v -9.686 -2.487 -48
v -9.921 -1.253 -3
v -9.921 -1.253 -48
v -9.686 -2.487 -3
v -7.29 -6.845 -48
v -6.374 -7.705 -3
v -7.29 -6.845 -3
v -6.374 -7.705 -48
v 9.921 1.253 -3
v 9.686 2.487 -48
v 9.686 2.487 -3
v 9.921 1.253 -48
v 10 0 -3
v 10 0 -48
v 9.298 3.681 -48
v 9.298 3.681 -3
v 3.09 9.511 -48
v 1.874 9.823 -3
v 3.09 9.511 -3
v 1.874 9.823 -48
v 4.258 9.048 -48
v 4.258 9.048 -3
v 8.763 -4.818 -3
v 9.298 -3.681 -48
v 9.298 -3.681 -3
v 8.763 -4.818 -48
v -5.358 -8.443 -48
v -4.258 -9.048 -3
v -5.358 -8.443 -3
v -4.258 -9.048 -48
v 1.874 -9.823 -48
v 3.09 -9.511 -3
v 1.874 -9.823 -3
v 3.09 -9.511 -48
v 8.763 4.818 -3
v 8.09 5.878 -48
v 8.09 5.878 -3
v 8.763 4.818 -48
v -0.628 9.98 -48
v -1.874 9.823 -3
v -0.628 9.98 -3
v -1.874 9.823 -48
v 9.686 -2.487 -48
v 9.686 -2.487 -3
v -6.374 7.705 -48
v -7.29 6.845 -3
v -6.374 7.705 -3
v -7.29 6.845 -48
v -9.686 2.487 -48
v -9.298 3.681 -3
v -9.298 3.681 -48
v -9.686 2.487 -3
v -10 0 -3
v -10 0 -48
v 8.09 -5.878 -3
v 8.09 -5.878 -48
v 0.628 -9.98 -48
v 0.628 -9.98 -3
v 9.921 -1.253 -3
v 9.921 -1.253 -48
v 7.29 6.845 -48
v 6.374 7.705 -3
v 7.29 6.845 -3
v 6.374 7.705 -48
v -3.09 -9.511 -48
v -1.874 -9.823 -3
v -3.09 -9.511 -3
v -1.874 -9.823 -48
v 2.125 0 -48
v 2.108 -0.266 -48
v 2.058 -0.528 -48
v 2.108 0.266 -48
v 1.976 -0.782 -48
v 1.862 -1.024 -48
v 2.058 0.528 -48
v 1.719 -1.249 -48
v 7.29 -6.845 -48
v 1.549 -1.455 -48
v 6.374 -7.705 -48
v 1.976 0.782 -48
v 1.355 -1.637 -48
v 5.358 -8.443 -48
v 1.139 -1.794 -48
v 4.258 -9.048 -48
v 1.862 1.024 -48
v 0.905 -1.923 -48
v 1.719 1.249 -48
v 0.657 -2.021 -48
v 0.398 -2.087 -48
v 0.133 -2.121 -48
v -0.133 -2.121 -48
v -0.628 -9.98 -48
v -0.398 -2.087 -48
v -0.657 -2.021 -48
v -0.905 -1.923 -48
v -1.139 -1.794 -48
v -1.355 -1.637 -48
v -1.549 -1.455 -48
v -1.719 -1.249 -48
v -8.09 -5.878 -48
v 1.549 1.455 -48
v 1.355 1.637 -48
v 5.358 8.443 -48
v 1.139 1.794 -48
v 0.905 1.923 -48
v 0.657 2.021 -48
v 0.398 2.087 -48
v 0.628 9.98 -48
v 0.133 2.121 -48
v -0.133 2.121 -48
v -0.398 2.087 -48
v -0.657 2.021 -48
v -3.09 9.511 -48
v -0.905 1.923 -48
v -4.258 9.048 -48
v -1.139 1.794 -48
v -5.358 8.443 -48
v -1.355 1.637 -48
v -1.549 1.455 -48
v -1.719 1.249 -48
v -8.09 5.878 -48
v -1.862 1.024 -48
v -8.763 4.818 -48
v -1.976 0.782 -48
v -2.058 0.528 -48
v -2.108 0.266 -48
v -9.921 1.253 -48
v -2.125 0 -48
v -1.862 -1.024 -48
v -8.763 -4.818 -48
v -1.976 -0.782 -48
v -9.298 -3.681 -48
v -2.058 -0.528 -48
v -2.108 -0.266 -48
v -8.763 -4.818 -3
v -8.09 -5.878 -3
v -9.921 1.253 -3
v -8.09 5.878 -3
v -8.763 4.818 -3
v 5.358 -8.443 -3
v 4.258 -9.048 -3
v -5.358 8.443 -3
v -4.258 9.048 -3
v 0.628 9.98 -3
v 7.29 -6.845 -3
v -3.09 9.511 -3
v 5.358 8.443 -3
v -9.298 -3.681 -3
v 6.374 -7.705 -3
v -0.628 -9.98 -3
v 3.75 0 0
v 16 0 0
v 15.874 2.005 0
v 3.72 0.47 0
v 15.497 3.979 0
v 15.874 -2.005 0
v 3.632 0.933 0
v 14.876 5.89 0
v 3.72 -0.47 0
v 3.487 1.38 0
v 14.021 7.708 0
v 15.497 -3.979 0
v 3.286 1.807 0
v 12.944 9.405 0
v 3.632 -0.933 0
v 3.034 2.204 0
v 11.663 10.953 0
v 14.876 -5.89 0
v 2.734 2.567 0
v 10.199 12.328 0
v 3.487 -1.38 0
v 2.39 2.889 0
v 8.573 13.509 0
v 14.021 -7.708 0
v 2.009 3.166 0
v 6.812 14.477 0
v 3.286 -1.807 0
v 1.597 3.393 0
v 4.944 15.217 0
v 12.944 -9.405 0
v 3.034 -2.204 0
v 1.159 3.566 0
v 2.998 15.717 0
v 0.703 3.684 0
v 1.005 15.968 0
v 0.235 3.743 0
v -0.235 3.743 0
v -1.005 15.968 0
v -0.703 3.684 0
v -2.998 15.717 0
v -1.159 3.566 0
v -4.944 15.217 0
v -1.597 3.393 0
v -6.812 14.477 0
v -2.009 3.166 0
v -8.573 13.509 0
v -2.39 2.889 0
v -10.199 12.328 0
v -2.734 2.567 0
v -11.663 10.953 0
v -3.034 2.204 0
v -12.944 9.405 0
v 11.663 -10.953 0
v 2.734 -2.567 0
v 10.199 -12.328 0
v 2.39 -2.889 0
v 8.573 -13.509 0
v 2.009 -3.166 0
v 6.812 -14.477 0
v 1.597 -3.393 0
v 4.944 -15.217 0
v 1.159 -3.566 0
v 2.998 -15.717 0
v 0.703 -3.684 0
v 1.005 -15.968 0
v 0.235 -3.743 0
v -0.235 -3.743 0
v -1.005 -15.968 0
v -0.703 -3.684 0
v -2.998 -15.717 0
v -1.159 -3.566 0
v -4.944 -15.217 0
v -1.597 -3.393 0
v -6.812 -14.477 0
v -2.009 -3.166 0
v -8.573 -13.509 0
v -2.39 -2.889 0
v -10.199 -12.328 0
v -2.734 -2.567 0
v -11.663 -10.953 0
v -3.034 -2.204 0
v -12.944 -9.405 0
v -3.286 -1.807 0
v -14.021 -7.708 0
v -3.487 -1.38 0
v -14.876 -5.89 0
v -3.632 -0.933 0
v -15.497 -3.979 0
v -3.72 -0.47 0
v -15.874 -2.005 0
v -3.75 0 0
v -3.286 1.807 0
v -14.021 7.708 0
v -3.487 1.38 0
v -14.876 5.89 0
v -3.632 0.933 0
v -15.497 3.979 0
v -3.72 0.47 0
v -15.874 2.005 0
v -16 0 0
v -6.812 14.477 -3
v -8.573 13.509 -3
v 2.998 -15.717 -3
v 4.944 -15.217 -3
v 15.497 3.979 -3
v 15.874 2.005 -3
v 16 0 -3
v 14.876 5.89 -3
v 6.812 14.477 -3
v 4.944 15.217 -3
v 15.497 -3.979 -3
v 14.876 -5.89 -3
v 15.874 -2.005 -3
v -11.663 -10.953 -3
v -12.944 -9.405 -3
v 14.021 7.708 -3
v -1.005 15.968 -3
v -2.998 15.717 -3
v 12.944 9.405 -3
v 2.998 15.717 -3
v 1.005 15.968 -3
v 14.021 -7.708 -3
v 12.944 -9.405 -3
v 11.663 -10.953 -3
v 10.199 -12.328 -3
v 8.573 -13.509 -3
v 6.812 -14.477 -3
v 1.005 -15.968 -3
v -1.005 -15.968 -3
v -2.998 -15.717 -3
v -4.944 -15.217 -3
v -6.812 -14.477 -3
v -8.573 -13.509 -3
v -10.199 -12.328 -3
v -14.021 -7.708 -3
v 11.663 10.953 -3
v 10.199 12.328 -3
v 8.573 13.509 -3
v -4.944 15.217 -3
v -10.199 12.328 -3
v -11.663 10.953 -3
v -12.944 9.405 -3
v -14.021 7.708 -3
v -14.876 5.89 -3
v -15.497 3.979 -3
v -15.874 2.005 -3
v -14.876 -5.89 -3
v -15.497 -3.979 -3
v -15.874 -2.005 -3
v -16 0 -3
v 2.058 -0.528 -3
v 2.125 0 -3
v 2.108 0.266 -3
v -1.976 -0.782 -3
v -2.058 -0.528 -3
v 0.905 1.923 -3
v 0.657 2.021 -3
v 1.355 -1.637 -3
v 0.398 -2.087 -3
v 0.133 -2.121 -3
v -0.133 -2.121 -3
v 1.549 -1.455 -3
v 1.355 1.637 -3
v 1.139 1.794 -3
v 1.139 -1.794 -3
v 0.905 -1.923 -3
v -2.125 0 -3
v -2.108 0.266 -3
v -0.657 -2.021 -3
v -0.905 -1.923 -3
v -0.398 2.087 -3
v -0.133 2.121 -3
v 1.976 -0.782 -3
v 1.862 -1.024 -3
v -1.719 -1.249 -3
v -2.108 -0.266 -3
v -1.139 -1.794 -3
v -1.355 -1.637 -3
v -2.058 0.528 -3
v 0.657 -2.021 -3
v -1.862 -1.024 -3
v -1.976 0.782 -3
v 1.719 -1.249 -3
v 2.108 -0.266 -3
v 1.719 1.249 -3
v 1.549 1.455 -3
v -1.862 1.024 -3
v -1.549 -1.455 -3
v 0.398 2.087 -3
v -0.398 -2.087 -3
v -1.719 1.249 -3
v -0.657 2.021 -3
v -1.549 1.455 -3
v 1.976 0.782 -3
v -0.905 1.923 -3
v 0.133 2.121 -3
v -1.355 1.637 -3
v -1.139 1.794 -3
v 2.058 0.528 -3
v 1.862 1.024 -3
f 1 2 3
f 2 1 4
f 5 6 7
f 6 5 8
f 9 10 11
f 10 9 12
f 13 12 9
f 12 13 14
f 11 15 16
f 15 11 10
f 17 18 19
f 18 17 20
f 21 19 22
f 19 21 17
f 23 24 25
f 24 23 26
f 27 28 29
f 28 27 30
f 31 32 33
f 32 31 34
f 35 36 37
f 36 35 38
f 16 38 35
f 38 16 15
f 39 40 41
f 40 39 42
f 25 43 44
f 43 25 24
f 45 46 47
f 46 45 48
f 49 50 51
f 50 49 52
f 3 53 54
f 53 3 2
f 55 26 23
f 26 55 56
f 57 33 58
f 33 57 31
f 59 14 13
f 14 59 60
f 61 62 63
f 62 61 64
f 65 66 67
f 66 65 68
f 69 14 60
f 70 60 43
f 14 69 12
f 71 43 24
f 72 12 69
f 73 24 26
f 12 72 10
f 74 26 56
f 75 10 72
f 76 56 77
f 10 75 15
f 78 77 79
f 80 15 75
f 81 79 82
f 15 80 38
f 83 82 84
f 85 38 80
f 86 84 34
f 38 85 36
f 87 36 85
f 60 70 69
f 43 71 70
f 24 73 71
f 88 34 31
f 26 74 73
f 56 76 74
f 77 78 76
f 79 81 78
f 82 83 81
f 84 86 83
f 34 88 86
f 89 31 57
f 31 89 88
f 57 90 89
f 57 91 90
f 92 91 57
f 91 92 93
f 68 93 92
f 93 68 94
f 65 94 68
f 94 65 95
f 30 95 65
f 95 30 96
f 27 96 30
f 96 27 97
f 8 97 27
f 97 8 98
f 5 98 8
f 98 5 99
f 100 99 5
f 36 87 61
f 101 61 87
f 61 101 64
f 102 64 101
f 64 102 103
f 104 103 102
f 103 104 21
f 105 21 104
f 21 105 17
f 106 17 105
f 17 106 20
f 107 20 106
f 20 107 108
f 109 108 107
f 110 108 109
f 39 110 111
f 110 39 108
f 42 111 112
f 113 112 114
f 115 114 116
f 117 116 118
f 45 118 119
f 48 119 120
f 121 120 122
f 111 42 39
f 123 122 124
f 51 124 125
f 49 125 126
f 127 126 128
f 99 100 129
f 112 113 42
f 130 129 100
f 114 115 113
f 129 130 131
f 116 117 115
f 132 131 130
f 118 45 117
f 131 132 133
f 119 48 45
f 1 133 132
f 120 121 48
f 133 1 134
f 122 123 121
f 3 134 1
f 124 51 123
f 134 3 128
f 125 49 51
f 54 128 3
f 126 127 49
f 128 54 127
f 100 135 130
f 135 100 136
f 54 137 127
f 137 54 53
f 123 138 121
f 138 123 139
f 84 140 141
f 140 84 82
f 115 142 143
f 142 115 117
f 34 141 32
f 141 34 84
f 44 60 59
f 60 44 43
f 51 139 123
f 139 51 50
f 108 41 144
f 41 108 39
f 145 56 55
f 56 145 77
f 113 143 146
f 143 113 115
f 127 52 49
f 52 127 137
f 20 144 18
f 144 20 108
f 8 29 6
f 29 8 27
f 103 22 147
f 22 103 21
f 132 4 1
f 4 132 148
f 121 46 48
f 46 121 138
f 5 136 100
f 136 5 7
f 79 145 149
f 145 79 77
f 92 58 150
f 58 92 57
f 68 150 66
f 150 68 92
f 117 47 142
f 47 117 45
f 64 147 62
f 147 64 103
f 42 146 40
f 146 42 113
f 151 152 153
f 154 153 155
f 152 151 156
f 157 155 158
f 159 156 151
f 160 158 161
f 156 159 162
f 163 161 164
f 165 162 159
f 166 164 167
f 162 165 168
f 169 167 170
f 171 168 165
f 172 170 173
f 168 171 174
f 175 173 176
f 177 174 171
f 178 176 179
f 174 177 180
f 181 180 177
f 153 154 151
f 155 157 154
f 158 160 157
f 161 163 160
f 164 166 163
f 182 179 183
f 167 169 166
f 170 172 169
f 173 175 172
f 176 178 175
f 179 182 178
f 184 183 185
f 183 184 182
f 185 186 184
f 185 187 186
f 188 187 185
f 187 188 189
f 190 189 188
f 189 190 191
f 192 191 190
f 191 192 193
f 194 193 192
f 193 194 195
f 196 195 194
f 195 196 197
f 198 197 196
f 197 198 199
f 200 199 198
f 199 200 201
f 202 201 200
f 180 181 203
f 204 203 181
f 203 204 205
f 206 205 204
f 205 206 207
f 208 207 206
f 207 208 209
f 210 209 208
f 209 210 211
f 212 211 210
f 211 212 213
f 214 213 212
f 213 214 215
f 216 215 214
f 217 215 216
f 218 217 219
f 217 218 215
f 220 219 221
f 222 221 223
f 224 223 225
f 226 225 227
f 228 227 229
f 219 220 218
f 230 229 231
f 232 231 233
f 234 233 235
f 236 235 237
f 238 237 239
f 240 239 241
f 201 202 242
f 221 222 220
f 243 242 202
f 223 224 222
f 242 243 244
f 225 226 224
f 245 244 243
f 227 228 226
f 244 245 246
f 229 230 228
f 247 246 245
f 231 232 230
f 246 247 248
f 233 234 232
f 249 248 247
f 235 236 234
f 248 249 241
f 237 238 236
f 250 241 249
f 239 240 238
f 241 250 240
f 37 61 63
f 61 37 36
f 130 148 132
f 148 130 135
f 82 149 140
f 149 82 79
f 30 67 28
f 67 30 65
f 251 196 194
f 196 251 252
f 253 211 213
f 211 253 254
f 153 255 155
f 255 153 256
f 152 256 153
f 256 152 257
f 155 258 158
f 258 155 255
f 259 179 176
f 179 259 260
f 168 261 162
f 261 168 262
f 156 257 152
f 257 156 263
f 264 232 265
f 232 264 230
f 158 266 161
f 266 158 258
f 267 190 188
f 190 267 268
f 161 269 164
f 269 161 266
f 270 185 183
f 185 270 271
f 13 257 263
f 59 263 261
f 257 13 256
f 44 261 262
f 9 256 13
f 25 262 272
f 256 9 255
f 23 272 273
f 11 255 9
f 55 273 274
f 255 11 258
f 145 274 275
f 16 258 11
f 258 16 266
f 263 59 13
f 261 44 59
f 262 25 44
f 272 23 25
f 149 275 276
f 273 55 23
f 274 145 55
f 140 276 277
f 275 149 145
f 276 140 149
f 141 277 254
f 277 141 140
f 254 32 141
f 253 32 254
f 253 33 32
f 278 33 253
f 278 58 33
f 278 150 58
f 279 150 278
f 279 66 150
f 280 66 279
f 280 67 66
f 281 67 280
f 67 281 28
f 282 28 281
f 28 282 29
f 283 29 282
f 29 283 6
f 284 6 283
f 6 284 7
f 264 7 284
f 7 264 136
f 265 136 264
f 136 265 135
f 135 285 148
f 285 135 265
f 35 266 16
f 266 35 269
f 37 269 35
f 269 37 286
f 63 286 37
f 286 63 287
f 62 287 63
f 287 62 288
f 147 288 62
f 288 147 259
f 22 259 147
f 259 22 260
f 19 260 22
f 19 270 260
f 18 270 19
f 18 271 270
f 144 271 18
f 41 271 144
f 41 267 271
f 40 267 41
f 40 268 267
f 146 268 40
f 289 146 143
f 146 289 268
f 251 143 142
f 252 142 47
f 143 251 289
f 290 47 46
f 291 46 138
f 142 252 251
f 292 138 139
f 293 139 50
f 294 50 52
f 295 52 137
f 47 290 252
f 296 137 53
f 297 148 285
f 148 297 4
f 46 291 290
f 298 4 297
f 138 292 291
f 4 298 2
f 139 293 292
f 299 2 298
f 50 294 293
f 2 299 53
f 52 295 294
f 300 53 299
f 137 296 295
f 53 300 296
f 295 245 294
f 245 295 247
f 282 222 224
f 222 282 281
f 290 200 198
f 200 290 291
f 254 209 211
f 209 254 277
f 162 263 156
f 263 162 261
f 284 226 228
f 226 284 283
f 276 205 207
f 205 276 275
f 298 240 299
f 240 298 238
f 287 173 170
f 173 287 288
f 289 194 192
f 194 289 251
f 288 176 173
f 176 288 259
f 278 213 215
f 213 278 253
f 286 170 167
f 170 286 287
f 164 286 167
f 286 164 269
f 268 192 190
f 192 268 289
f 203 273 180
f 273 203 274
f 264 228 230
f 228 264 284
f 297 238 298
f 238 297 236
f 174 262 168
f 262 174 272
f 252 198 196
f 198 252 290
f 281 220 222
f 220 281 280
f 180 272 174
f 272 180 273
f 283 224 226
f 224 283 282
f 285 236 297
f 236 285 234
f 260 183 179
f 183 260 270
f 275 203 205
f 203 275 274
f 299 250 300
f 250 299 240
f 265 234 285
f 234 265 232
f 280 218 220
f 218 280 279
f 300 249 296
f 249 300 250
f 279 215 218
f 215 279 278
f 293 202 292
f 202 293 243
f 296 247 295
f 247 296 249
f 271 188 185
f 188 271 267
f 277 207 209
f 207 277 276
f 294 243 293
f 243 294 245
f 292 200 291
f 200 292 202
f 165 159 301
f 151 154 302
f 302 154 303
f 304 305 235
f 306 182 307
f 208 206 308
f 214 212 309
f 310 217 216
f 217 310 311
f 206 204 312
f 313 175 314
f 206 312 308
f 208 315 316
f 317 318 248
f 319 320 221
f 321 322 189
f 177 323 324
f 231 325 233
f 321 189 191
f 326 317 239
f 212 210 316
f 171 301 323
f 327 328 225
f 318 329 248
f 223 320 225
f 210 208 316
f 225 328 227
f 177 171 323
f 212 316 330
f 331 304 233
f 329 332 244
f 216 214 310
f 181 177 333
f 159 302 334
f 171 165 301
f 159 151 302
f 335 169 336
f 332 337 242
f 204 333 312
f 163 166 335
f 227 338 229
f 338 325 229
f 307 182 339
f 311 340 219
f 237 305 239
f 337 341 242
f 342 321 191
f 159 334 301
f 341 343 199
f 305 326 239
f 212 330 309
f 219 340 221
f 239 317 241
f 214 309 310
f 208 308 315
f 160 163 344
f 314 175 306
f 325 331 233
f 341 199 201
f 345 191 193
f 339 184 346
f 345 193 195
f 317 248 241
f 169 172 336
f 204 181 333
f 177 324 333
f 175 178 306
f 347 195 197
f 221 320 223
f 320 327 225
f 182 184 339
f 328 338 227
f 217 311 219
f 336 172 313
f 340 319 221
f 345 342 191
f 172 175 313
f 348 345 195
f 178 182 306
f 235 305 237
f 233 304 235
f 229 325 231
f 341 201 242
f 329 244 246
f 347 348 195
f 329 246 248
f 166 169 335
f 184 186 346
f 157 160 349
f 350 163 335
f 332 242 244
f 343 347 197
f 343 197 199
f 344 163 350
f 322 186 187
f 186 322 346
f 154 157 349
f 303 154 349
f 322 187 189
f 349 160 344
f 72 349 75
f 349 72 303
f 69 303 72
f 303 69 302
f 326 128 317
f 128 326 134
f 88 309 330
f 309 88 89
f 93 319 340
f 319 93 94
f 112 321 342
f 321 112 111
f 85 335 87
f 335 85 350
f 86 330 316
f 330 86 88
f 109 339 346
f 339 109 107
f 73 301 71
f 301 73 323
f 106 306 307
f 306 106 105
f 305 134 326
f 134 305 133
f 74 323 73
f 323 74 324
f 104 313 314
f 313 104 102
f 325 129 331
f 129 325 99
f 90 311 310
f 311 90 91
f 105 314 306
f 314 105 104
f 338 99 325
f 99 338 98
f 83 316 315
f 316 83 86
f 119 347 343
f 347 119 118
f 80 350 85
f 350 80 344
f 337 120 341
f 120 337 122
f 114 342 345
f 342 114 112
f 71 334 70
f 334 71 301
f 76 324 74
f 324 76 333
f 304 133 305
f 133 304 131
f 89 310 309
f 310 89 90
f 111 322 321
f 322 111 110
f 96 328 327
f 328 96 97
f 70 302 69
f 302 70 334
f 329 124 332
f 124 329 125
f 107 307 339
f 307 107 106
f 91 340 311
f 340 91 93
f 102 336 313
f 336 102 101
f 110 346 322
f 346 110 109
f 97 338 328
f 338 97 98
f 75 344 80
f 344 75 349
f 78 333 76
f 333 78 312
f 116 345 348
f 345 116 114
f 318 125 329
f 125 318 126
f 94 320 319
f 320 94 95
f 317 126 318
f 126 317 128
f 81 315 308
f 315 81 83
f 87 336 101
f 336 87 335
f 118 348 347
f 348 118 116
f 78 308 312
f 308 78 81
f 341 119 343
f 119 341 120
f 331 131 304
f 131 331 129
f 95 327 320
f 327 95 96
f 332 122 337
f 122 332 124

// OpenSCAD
$fn = 50;


difference() {
	union() {
		translate(v = [0, 0, -48.0000000000]) {
			cylinder(h = 48, r = 10.0000000000);
		}
		translate(v = [0, 0, -3.0000000000]) {
			cylinder(h = 3, r = 16.0000000000);
		}
	}
	union() {
		translate(v = [0, 0, 0]) {
			rotate(a = [0, 0, 0]) {
				difference() {
					union() {
						#translate(v = [0, 0, -48.0000000000]) {
							cylinder(h = 48, r = 2.0000000000);
						}
						#translate(v = [0, 0, -3]) {
							cylinder(h = 3, r = 10.0000000000, r1 = 2.1250000000, r2 = 3.7500000000);
						}
						#translate(v = [0, 0, -48.0000000000]) {
							cylinder(h = 48, r = 2.1250000000);
						}
						#translate(v = [0, 0, -48.0000000000]) {
							cylinder(h = 48, r = 2.0000000000);
						}
					}
					union();
				}
			}
		}
	}
}
